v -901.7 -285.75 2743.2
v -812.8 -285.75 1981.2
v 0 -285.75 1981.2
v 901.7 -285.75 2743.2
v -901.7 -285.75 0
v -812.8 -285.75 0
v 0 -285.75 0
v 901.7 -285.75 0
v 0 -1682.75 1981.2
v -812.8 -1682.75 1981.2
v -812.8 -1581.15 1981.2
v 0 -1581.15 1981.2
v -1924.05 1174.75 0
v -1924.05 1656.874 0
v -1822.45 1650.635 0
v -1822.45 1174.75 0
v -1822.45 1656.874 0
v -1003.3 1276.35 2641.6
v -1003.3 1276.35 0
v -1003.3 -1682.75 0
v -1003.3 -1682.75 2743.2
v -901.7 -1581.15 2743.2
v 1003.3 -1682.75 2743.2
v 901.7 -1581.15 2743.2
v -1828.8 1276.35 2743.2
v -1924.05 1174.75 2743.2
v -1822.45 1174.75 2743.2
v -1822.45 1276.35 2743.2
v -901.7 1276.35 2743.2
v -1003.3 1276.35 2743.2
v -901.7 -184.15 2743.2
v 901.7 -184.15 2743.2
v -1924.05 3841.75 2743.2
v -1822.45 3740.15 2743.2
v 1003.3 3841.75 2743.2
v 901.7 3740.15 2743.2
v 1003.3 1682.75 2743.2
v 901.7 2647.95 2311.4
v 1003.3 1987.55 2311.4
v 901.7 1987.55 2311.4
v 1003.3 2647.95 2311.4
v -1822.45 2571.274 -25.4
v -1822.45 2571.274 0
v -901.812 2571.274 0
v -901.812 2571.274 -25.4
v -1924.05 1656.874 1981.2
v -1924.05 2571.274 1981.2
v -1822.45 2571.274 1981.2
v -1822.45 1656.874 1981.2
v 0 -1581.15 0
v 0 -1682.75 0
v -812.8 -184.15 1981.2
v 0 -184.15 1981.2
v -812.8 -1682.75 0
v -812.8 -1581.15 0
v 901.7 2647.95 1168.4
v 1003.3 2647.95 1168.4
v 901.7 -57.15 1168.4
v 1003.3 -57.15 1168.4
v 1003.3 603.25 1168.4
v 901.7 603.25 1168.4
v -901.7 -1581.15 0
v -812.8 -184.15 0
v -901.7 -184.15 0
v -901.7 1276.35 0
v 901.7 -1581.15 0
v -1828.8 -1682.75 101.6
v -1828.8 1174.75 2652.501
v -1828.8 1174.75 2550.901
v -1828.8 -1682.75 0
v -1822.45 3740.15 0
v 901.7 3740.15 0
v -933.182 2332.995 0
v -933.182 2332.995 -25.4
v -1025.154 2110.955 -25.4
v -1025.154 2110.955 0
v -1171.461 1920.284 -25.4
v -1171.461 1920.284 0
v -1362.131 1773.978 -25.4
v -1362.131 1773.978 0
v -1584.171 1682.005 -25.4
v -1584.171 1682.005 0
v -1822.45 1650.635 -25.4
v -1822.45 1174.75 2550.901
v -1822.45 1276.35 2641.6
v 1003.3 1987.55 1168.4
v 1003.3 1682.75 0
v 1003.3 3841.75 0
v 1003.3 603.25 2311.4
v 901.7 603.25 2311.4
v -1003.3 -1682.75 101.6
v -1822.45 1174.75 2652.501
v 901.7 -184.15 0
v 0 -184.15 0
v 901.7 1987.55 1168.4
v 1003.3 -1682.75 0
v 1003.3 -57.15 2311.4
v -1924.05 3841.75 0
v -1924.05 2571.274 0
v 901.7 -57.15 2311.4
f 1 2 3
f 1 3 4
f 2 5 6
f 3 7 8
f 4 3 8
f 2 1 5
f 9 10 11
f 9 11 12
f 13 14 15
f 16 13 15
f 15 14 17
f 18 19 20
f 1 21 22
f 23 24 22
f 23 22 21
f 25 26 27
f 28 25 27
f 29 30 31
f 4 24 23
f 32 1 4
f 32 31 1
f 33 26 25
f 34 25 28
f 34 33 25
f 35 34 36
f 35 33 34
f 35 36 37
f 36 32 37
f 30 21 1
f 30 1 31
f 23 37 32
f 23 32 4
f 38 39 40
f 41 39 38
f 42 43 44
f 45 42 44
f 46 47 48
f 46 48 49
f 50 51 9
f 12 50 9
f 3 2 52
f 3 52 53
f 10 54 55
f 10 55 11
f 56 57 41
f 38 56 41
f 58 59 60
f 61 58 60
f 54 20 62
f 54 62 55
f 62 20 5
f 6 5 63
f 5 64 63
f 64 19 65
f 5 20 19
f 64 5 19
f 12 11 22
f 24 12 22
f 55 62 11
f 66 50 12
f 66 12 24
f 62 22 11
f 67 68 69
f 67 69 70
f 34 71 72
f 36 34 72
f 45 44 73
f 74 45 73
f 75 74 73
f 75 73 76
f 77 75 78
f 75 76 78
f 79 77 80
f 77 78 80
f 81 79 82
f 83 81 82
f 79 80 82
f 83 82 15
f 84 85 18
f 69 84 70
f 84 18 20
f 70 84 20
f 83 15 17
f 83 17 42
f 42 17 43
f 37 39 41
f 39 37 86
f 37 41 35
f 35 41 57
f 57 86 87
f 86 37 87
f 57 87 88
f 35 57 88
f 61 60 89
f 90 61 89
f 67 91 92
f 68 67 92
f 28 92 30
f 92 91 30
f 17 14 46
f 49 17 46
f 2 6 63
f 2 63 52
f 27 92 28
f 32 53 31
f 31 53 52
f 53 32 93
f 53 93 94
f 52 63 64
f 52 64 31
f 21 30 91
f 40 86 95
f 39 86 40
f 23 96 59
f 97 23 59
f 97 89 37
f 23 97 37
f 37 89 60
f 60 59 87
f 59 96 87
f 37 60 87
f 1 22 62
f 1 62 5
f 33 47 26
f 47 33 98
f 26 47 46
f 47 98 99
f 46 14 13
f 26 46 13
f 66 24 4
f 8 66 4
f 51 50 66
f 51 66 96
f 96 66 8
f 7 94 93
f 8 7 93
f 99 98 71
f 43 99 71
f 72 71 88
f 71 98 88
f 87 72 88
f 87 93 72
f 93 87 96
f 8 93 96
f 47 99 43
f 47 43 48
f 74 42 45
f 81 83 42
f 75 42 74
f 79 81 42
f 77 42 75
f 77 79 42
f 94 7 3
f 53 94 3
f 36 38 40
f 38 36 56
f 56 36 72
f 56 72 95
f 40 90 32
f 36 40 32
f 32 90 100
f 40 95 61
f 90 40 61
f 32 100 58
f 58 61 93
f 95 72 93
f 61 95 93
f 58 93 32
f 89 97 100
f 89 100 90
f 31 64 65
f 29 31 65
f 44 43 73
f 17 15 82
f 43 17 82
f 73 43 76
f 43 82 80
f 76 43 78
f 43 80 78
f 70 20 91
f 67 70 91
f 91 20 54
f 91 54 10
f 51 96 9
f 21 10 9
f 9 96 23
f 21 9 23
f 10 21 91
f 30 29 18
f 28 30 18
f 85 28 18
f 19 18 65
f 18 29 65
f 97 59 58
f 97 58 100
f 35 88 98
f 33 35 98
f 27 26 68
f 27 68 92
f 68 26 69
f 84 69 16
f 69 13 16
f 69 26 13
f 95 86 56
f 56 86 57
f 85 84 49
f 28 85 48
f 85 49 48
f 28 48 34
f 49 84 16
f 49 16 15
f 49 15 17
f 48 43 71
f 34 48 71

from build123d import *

# Parameters (mm, degrees)
F0_W      = 1803.4
F0_H      = 1295.4
F1_DEPTH  = 2743.2
F2_W      = 812.8
F2_H      = 1981.2
F3_DEPTH  = 3606.8
F4_W      = 914.4
F4_H      = 1981.2
F5_DEPTH  = 101.6
F6_W      = 660.4
F6_H      = 1143
F7_DEPTH  = 101.6
F8_W      = 660.4
F8_H      = 1143
F9_DEPTH  = 101.6
F11_DEPTH = 25.4
F13_DEPTH = 825.5


# Not quite as in the source:
# - ends of sketch curves that miss each other by under 0.0002 mm in the source are joined


with BuildPart() as f1:
    # F0 (on Top) → F1 (new body)
    with BuildSketch(Plane.XY):
        Polygon((901.7, 3740.1499866486), (901.7, 1682.7499866486), (901.7, 1581.15), (901.7, -184.15), (-901.7, -184.15), (-901.7, 1276.3499866486), (-1003.2999866486, 1276.3499866486), (-1003.2999866486, -1682.7499866486), (1003.2999866486, -1682.7499866486), (1003.2999866486, 1682.7499866486), (1003.3, 3841.7499866486), (-1924.05, 3841.7499866486), (-1924.05, 1174.7499866486), (-1822.45, 1174.7499866486), (-1822.45, 3740.1499866486), align=None)
        with Locations((0, -933.45)):
            Rectangle(F0_W, F0_H, mode=Mode.SUBTRACT)
    extrude(amount=F1_DEPTH)

    # F2 (on face) → F3 (cut)
    with BuildSketch(Plane.XZ.offset(1682.7499866486)):
        with Locations((-406.4, 990.6)):
            Rectangle(F2_W, F2_H)
    extrude(amount=-F3_DEPTH, mode=Mode.SUBTRACT)

    # F4 (on face) → F5 (cut)
    with BuildSketch(Plane(origin=(-1924.05, 0, 0), x_dir=(0, -1, 0), z_dir=(-1, 0, 0))):
        with Locations((-2114.073614502, 990.6)):
            Rectangle(F4_W, F4_H)
    extrude(amount=-F5_DEPTH, mode=Mode.SUBTRACT)

    # F6 (on face) → F7 (cut)
    with BuildSketch(Plane.YZ.offset(1003.2999866486)):
        with Locations((273.0499866486, 1739.9)):
            Rectangle(F6_W, F6_H)
    extrude(amount=-F7_DEPTH, mode=Mode.SUBTRACT)

    # F8 (on face) → F9 (cut)
    with BuildSketch(Plane.YZ.offset(1003.3)):
        with Locations((2317.7499866486, 1739.9)):
            Rectangle(F8_W, F8_H)
    extrude(amount=-F9_DEPTH, mode=Mode.SUBTRACT)

    # F10 (on face) → F11 (join)
    with BuildSketch(Plane(origin=(0, 0, 0), x_dir=(1, 0, 0), z_dir=(0, 0, -1))):
        with BuildLine():
            Line((-1822.45, -1650.6354808807), (-1822.45, -2571.273614502))
            Line((-1822.45, -2571.273614502), (-901.8118663788, -2571.273614502))
            ThreePointArc((-901.8118663788, -2571.273614502), (-1171.4605326975, -1920.2841471995), (-1822.45, -1650.6354808807))
        make_face()
    extrude(amount=F11_DEPTH)

    # F12 (on face) → F13 (join)
    with BuildSketch(Plane(origin=(-1003.2999866486, 0, 0), x_dir=(0, -1, 0), z_dir=(-1, 0, 0))):
        Polygon((1682.7499866486, 101.6), (-1276.3499866486, 2743.2), (-1276.3499866486, 2641.6), (1682.7499866486, 0), align=None)
    extrude(amount=F13_DEPTH)


solid = f1.part
